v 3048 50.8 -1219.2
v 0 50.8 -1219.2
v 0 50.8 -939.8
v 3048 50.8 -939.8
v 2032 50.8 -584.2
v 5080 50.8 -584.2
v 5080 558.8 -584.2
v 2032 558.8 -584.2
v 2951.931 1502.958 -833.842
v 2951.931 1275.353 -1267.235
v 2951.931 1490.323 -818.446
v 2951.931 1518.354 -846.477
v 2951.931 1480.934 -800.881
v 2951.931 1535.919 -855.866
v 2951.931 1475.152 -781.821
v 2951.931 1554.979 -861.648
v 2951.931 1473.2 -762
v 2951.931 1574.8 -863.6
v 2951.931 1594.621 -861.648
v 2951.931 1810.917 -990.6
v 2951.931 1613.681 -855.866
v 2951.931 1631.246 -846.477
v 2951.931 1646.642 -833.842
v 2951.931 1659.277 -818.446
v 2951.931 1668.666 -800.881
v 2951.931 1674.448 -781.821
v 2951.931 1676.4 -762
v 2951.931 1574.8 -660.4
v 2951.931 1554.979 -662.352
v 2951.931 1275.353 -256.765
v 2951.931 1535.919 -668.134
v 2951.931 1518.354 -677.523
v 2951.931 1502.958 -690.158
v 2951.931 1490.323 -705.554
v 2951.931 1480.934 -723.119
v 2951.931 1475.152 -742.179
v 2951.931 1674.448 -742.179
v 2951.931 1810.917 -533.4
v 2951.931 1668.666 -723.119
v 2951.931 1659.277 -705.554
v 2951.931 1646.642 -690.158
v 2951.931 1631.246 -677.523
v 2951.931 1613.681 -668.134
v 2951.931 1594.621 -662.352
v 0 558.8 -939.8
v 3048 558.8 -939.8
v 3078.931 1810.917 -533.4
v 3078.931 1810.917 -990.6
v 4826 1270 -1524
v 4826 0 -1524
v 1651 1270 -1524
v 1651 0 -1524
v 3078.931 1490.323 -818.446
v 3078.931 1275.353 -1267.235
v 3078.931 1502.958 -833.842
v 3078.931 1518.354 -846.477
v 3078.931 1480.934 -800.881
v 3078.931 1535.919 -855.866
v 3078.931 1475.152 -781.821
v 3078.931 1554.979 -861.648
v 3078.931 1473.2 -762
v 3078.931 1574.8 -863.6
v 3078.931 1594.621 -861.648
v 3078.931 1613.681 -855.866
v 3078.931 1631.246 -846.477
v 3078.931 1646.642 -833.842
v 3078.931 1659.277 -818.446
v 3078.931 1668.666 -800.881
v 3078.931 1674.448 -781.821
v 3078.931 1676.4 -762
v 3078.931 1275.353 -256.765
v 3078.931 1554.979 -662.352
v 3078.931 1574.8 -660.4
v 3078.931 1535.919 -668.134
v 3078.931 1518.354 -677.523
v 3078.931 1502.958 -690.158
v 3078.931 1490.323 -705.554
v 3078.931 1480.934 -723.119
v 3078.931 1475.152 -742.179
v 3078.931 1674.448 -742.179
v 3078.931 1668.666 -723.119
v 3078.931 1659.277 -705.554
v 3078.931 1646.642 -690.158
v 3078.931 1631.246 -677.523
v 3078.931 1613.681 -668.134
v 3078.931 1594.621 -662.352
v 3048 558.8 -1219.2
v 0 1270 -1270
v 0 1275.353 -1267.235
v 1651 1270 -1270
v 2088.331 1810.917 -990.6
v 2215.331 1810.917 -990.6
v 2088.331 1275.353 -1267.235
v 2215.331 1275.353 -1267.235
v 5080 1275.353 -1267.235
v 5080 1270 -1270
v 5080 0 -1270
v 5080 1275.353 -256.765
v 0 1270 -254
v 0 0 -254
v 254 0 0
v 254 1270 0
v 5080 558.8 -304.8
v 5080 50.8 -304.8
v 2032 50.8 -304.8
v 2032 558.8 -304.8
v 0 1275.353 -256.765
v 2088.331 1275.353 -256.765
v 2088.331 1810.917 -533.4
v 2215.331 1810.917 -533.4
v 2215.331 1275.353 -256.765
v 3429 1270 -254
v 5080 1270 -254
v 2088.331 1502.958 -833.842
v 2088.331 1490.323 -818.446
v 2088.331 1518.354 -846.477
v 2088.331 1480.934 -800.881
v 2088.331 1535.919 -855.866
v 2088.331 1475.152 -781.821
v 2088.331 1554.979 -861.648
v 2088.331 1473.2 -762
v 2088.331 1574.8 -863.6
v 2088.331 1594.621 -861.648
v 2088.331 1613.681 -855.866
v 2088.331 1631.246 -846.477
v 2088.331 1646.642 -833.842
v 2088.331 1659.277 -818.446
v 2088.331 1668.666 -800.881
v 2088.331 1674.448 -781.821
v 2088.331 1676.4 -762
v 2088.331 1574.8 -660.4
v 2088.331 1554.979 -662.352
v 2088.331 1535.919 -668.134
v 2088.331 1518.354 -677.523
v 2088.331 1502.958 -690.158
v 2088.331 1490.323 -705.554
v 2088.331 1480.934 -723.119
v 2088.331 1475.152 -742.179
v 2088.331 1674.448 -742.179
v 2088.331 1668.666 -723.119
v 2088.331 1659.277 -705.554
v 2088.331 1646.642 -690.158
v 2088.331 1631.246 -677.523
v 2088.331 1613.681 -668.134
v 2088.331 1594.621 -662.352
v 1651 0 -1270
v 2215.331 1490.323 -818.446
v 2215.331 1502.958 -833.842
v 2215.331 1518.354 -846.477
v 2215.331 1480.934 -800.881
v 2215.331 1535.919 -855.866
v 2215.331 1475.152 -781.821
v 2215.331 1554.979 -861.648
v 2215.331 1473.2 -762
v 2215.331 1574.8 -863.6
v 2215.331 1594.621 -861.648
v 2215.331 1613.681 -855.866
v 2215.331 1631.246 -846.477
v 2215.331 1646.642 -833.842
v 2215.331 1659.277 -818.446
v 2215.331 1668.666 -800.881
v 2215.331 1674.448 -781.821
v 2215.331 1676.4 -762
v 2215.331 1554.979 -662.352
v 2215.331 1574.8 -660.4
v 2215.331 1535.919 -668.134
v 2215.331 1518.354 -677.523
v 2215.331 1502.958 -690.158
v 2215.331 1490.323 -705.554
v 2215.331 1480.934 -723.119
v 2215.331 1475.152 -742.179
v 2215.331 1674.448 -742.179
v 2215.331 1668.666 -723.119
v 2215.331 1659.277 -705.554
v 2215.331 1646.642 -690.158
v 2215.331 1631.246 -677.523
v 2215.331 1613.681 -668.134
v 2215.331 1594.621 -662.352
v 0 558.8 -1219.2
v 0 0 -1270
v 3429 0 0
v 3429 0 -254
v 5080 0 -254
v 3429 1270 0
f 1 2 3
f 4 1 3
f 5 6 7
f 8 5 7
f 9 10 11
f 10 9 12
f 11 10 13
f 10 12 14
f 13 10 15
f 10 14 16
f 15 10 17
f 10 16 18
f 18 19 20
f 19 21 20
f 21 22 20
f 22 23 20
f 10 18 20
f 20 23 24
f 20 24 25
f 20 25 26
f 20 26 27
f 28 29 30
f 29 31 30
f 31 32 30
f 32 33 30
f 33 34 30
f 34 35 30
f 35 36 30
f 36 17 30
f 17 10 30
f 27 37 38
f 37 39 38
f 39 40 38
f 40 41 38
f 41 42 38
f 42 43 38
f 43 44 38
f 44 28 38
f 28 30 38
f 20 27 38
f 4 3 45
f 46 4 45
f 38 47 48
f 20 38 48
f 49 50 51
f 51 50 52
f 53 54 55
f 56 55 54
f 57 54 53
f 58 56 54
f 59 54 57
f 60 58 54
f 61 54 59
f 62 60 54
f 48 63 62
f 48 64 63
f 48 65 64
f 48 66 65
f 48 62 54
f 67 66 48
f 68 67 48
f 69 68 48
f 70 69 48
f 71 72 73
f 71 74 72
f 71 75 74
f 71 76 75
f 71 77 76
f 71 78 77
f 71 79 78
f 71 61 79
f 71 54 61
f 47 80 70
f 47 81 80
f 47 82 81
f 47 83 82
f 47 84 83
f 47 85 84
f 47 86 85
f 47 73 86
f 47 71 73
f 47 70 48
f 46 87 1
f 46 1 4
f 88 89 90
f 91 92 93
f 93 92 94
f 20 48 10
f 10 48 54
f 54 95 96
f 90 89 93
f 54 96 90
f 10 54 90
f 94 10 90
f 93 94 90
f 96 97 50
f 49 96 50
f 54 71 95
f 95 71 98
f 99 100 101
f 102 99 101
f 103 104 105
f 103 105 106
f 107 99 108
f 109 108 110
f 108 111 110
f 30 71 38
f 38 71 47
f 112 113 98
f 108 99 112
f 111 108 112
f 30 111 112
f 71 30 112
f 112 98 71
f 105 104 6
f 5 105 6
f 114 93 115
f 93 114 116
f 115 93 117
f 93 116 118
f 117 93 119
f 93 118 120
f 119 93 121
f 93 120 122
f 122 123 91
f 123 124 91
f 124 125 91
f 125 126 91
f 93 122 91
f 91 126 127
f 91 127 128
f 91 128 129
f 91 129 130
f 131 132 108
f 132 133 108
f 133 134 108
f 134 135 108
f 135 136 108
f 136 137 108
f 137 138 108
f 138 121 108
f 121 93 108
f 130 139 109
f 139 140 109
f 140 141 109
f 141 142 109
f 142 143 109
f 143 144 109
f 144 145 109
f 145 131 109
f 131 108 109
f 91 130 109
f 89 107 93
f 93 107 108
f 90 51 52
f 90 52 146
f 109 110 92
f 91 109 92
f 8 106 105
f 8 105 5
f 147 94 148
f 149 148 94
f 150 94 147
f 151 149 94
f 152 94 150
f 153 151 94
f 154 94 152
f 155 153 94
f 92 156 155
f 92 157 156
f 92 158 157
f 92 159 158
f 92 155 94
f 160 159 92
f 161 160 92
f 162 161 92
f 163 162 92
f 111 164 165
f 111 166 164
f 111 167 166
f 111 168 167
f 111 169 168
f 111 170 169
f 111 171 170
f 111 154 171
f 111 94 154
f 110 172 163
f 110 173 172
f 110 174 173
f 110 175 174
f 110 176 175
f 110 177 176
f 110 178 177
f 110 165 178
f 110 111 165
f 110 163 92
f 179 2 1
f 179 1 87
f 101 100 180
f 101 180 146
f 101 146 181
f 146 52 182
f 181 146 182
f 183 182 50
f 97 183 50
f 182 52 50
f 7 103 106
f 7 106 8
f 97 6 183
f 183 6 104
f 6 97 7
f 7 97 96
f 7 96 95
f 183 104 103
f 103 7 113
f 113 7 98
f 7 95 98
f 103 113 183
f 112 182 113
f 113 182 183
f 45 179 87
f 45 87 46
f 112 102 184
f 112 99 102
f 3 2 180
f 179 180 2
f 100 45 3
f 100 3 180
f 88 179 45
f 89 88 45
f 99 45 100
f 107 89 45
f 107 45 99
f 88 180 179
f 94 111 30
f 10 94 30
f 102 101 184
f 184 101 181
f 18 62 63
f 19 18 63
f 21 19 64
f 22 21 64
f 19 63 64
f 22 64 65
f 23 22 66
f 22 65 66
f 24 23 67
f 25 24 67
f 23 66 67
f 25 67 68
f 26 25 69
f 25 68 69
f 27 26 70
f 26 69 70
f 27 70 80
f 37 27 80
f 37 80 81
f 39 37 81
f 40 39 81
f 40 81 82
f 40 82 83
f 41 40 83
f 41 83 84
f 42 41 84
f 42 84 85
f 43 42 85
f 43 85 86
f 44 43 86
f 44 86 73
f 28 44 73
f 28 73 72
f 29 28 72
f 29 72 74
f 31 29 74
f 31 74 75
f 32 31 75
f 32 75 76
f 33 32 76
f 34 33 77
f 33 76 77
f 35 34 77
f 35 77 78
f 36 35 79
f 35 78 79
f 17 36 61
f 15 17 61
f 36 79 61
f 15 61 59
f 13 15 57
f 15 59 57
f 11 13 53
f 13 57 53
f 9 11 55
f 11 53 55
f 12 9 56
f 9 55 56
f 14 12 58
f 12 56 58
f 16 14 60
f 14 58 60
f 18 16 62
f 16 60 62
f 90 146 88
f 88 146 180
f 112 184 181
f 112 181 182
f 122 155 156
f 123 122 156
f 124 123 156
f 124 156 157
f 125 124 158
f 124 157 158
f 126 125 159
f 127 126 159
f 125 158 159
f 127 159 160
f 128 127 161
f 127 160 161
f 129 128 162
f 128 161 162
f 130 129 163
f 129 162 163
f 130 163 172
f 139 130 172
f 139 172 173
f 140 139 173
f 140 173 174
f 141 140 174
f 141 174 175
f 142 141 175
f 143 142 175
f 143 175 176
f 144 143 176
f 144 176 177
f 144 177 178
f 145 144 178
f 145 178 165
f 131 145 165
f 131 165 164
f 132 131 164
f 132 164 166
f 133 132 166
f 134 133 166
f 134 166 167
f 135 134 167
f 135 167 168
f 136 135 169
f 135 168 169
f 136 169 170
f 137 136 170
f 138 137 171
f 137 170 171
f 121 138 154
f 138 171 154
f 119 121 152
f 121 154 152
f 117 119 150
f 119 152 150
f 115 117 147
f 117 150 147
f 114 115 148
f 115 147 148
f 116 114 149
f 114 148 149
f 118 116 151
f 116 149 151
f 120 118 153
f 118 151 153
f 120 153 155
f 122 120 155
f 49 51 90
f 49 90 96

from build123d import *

# Parameters (mm, degrees)
BOSS_EXTRUDE1_DEPTH = 1270
SKETCH2_W           = 279.4
SKETCH2_H           = 508
CUT_EXTRUDE1_DEPTH  = 3048
SKETCH4_W           = 279.4
SKETCH4_H           = 508
CUT_EXTRUDE2_DEPTH  = 3048
SKETCH5_R           = 101.6
BOSS_EXTRUDE2_DEPTH = 5080
CUT_EXTRUDE3_REACH  = 5606.319
SKETCH6_W           = 2088.330697782
SKETCH6_H           = 535.563960187
SKETCH6_W_2         = 2001.069302218
SKETCH6_W_3         = 736.6


with BuildPart() as part:
    # Sketch1 → Boss-Extrude1 (new body)
    with BuildSketch(Plane(origin=(0, 0, 0), x_dir=(1, 0, 0), z_dir=(0, 1, 0))):
        Polygon((0, 254), (254, 0), (3429, 0), (3429, 254), (5080, 254), (5080, 1270), (4826, 1524), (1651, 1524), (1651, 1270), (0, 1270), align=None)
    extrude(amount=BOSS_EXTRUDE1_DEPTH)

    # Sketch2 → Cut-Extrude1 (cut)
    with BuildSketch(Plane(origin=(5080, 0, 0), x_dir=(0, 0, -1), z_dir=(1, 0, 0))):
        with Locations((444.5, 304.8)):
            Rectangle(SKETCH2_W, SKETCH2_H)
    extrude(amount=-CUT_EXTRUDE1_DEPTH, mode=Mode.SUBTRACT)

    # Sketch4 → Cut-Extrude2 (cut)
    with BuildSketch(Plane.ZY):
        with Locations((-1079.5, 304.8)):
            Rectangle(SKETCH4_W, SKETCH4_H)
    extrude(amount=-CUT_EXTRUDE2_DEPTH, mode=Mode.SUBTRACT)

    # Sketch5 → Boss-Extrude2 (add, through all)
    with BuildSketch(Plane(origin=(5080, 0, 0), x_dir=(0, 0, -1), z_dir=(1, 0, 0))):
        Polygon((254, 1270), (533.4, 1810.916704273), (990.6, 1810.916704273), (1270, 1270), align=None)
        with Locations((762, 1574.8)):
            Circle(SKETCH5_R, mode=Mode.SUBTRACT)
    extrude(amount=-BOSS_EXTRUDE2_DEPTH)

    # Cut-Extrude3: up to this plane
    cut_extrude3_end = Plane(origin=(0, 1270, -1270), z_dir=(0, 0.45892459056390483, -0.888475222038157))
    # Sketch6 → Cut-Extrude3 (cut, up to the surface)
    with BuildSketch(Plane.XY, mode=Mode.PRIVATE) as cut_extrude3_sk1:
        with Locations((1044.165348891, 1543.13472418)):
            Rectangle(SKETCH6_W, SKETCH6_H)
    cut_extrude3_tool1 = split(extrude(cut_extrude3_sk1.sketch, amount=-CUT_EXTRUDE3_REACH, mode=Mode.PRIVATE), bisect_by=cut_extrude3_end, keep=Keep.BOTH, mode=Mode.PRIVATE)
    add(cut_extrude3_tool1.solids().sort_by_distance((1044.165349, 1543.134724, 0))[0], mode=Mode.SUBTRACT)
    # Sketch6 → Cut-Extrude3 (cut, up to the surface)
    with BuildSketch(Plane.XY, mode=Mode.PRIVATE) as cut_extrude3_sk2:
        with Locations((4079.465348891, 1543.13472418)):
            Rectangle(SKETCH6_W_2, SKETCH6_H)
    cut_extrude3_tool2 = split(extrude(cut_extrude3_sk2.sketch, amount=-CUT_EXTRUDE3_REACH, mode=Mode.PRIVATE), bisect_by=cut_extrude3_end, keep=Keep.BOTH, mode=Mode.PRIVATE)
    add(cut_extrude3_tool2.solids().sort_by_distance((4079.465349, 1543.134724, 0))[0], mode=Mode.SUBTRACT)
    # Sketch6 → Cut-Extrude3 (cut, up to the surface)
    with BuildSketch(Plane.XY, mode=Mode.PRIVATE) as cut_extrude3_sk3:
        with Locations((2583.630697782, 1543.13472418)):
            Rectangle(SKETCH6_W_3, SKETCH6_H)
    cut_extrude3_tool3 = split(extrude(cut_extrude3_sk3.sketch, amount=-CUT_EXTRUDE3_REACH, mode=Mode.PRIVATE), bisect_by=cut_extrude3_end, keep=Keep.BOTH, mode=Mode.PRIVATE)
    add(cut_extrude3_tool3.solids().sort_by_distance((2583.630698, 1543.134724, 0))[0], mode=Mode.SUBTRACT)


solid = part.part
